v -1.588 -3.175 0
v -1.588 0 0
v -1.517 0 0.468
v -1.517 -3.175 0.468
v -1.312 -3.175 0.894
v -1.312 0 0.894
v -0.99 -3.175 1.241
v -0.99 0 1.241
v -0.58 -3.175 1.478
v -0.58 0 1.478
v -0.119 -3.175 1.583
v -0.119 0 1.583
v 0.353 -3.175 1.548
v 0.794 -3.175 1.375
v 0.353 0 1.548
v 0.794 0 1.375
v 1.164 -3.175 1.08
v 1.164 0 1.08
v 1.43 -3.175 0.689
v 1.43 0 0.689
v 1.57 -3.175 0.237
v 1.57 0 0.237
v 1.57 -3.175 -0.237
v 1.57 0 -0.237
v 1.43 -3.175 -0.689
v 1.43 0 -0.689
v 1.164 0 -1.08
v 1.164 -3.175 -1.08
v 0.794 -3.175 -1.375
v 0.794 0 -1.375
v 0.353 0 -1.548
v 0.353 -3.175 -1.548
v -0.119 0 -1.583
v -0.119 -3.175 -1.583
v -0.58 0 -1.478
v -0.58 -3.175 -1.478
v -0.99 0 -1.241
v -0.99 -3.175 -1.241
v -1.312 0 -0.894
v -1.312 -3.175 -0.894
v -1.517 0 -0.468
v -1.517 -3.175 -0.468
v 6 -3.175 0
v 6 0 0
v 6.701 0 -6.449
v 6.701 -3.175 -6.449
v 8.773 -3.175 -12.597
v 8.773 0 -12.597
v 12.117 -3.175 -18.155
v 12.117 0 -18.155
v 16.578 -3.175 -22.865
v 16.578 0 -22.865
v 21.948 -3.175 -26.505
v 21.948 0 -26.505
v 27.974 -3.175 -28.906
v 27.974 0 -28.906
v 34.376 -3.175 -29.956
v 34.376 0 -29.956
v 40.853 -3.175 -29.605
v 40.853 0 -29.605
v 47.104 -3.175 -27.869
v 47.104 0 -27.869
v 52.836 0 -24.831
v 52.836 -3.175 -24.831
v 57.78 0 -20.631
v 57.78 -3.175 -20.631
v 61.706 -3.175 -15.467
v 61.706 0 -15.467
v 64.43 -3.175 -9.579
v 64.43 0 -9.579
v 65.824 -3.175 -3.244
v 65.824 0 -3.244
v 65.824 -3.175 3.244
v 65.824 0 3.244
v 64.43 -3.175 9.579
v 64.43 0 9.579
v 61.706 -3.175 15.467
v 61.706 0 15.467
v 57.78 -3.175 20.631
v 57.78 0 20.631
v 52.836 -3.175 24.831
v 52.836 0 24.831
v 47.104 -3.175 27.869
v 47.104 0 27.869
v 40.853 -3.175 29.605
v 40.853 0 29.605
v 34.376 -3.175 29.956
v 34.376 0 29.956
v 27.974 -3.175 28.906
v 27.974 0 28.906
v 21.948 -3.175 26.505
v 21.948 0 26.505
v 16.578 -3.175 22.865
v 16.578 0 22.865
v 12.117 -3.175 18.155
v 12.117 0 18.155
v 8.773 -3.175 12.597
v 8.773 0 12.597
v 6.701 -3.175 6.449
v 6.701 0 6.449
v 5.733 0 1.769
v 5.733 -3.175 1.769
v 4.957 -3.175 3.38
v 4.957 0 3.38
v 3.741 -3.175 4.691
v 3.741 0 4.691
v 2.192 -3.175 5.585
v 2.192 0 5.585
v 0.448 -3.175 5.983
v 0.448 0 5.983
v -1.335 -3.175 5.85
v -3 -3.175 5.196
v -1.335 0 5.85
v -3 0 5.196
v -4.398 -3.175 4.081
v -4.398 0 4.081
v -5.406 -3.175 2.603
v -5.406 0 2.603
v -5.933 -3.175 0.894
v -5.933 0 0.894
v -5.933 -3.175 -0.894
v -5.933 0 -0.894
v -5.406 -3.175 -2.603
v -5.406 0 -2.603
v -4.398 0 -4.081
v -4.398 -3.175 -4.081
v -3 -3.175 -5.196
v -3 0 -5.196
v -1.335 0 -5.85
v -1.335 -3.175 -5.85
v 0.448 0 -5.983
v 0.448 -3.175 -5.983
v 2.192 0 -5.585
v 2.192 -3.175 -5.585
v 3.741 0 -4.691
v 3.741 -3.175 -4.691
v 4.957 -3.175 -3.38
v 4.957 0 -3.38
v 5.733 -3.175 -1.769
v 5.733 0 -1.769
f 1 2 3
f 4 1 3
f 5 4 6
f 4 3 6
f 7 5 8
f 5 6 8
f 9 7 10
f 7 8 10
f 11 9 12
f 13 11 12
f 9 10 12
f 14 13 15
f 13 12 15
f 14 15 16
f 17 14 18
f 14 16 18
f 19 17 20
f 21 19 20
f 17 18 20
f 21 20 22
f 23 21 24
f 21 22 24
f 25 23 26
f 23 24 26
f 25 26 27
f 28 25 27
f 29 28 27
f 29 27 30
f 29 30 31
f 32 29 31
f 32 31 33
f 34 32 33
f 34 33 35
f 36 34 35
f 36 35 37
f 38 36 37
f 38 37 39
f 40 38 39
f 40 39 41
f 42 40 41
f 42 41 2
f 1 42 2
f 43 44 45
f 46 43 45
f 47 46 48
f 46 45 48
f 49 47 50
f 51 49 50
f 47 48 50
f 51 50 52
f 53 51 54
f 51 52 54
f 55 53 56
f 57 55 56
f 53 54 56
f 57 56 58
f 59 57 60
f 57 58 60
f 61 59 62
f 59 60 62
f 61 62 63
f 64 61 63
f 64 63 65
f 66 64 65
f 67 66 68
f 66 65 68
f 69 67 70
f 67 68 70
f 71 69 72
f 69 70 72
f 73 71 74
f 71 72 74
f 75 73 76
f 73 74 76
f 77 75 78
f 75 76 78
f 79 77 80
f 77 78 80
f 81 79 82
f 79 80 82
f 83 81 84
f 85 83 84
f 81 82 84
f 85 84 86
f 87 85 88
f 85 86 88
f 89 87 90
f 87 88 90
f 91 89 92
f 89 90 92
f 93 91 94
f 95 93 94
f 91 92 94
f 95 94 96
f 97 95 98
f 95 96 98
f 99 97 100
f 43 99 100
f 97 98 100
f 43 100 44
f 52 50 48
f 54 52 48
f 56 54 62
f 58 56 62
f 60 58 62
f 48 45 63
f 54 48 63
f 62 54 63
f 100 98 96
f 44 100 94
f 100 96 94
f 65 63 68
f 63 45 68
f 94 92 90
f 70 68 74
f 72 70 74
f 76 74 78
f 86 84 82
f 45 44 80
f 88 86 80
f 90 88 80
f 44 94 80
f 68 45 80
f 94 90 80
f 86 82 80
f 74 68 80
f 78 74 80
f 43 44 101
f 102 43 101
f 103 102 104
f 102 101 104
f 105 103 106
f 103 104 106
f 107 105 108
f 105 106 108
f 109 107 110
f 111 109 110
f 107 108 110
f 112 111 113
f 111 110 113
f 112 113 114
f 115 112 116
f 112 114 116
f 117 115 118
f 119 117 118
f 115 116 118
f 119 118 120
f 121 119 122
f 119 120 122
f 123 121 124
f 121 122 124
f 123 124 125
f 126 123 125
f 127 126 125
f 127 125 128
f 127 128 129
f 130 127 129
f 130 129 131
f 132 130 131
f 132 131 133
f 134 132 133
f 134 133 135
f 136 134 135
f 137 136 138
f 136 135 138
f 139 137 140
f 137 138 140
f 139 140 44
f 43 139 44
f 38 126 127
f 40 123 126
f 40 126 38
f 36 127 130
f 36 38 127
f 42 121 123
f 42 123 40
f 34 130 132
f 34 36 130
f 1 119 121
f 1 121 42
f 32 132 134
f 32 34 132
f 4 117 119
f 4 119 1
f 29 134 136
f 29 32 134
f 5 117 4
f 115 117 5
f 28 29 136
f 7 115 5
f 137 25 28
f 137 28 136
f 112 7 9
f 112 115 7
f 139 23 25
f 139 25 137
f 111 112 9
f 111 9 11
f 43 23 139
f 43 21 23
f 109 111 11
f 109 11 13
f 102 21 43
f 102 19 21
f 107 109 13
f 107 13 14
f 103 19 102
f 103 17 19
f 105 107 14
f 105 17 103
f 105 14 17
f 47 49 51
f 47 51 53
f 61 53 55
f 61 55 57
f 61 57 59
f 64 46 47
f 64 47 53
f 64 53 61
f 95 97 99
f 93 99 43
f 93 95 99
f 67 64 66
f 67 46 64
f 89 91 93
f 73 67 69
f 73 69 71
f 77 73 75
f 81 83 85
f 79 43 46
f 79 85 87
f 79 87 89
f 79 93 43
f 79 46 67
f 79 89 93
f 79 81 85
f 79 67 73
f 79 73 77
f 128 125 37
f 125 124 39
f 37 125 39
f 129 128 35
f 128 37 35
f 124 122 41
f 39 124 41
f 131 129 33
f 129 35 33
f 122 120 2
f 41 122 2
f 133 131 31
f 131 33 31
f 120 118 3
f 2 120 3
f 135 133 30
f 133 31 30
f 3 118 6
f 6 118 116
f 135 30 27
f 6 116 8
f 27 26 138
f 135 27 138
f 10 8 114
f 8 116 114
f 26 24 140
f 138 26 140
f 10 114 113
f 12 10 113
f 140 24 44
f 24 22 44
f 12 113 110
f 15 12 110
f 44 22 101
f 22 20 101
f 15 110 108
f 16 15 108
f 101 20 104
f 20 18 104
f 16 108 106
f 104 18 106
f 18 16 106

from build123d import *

# Parameters (mm, degrees)
F0_R     = 6
F1_DEPTH = 3.175
F2_R     = 1.5875
F3_DEPTH = 25.4


with BuildPart() as f1:
    # F0 (on Front) → F1 (new body)
    with BuildSketch(Plane.XZ):
        with BuildLine():
            ThreePointArc((66, 0), (36, 30), (6, 0))
            ThreePointArc((6, 0), (36, -30), (66, 0))
        make_face()
        with BuildLine():
            ThreePointArc((37.5875, 0), (36, -1.5875), (34.4125, 0))
            ThreePointArc((34.4125, 0), (36, 1.5875), (37.5875, 0))
        make_face(mode=Mode.SUBTRACT)
        with BuildLine():
            ThreePointArc((37.5875, 0), (36, 1.5875), (34.4125, 0))
            ThreePointArc((34.4125, 0), (36, -1.5875), (37.5875, 0))
        make_face()
        Circle(F0_R)
    extrude(amount=F1_DEPTH)

    # F2 (on face) → F3 (cut)
    with BuildSketch(Plane(origin=(0, 0, 0), x_dir=(-1, 0, 0), z_dir=(0, 1, 0))):
        Circle(F2_R)
    extrude(amount=-F3_DEPTH, mode=Mode.SUBTRACT)


solid = f1.part
